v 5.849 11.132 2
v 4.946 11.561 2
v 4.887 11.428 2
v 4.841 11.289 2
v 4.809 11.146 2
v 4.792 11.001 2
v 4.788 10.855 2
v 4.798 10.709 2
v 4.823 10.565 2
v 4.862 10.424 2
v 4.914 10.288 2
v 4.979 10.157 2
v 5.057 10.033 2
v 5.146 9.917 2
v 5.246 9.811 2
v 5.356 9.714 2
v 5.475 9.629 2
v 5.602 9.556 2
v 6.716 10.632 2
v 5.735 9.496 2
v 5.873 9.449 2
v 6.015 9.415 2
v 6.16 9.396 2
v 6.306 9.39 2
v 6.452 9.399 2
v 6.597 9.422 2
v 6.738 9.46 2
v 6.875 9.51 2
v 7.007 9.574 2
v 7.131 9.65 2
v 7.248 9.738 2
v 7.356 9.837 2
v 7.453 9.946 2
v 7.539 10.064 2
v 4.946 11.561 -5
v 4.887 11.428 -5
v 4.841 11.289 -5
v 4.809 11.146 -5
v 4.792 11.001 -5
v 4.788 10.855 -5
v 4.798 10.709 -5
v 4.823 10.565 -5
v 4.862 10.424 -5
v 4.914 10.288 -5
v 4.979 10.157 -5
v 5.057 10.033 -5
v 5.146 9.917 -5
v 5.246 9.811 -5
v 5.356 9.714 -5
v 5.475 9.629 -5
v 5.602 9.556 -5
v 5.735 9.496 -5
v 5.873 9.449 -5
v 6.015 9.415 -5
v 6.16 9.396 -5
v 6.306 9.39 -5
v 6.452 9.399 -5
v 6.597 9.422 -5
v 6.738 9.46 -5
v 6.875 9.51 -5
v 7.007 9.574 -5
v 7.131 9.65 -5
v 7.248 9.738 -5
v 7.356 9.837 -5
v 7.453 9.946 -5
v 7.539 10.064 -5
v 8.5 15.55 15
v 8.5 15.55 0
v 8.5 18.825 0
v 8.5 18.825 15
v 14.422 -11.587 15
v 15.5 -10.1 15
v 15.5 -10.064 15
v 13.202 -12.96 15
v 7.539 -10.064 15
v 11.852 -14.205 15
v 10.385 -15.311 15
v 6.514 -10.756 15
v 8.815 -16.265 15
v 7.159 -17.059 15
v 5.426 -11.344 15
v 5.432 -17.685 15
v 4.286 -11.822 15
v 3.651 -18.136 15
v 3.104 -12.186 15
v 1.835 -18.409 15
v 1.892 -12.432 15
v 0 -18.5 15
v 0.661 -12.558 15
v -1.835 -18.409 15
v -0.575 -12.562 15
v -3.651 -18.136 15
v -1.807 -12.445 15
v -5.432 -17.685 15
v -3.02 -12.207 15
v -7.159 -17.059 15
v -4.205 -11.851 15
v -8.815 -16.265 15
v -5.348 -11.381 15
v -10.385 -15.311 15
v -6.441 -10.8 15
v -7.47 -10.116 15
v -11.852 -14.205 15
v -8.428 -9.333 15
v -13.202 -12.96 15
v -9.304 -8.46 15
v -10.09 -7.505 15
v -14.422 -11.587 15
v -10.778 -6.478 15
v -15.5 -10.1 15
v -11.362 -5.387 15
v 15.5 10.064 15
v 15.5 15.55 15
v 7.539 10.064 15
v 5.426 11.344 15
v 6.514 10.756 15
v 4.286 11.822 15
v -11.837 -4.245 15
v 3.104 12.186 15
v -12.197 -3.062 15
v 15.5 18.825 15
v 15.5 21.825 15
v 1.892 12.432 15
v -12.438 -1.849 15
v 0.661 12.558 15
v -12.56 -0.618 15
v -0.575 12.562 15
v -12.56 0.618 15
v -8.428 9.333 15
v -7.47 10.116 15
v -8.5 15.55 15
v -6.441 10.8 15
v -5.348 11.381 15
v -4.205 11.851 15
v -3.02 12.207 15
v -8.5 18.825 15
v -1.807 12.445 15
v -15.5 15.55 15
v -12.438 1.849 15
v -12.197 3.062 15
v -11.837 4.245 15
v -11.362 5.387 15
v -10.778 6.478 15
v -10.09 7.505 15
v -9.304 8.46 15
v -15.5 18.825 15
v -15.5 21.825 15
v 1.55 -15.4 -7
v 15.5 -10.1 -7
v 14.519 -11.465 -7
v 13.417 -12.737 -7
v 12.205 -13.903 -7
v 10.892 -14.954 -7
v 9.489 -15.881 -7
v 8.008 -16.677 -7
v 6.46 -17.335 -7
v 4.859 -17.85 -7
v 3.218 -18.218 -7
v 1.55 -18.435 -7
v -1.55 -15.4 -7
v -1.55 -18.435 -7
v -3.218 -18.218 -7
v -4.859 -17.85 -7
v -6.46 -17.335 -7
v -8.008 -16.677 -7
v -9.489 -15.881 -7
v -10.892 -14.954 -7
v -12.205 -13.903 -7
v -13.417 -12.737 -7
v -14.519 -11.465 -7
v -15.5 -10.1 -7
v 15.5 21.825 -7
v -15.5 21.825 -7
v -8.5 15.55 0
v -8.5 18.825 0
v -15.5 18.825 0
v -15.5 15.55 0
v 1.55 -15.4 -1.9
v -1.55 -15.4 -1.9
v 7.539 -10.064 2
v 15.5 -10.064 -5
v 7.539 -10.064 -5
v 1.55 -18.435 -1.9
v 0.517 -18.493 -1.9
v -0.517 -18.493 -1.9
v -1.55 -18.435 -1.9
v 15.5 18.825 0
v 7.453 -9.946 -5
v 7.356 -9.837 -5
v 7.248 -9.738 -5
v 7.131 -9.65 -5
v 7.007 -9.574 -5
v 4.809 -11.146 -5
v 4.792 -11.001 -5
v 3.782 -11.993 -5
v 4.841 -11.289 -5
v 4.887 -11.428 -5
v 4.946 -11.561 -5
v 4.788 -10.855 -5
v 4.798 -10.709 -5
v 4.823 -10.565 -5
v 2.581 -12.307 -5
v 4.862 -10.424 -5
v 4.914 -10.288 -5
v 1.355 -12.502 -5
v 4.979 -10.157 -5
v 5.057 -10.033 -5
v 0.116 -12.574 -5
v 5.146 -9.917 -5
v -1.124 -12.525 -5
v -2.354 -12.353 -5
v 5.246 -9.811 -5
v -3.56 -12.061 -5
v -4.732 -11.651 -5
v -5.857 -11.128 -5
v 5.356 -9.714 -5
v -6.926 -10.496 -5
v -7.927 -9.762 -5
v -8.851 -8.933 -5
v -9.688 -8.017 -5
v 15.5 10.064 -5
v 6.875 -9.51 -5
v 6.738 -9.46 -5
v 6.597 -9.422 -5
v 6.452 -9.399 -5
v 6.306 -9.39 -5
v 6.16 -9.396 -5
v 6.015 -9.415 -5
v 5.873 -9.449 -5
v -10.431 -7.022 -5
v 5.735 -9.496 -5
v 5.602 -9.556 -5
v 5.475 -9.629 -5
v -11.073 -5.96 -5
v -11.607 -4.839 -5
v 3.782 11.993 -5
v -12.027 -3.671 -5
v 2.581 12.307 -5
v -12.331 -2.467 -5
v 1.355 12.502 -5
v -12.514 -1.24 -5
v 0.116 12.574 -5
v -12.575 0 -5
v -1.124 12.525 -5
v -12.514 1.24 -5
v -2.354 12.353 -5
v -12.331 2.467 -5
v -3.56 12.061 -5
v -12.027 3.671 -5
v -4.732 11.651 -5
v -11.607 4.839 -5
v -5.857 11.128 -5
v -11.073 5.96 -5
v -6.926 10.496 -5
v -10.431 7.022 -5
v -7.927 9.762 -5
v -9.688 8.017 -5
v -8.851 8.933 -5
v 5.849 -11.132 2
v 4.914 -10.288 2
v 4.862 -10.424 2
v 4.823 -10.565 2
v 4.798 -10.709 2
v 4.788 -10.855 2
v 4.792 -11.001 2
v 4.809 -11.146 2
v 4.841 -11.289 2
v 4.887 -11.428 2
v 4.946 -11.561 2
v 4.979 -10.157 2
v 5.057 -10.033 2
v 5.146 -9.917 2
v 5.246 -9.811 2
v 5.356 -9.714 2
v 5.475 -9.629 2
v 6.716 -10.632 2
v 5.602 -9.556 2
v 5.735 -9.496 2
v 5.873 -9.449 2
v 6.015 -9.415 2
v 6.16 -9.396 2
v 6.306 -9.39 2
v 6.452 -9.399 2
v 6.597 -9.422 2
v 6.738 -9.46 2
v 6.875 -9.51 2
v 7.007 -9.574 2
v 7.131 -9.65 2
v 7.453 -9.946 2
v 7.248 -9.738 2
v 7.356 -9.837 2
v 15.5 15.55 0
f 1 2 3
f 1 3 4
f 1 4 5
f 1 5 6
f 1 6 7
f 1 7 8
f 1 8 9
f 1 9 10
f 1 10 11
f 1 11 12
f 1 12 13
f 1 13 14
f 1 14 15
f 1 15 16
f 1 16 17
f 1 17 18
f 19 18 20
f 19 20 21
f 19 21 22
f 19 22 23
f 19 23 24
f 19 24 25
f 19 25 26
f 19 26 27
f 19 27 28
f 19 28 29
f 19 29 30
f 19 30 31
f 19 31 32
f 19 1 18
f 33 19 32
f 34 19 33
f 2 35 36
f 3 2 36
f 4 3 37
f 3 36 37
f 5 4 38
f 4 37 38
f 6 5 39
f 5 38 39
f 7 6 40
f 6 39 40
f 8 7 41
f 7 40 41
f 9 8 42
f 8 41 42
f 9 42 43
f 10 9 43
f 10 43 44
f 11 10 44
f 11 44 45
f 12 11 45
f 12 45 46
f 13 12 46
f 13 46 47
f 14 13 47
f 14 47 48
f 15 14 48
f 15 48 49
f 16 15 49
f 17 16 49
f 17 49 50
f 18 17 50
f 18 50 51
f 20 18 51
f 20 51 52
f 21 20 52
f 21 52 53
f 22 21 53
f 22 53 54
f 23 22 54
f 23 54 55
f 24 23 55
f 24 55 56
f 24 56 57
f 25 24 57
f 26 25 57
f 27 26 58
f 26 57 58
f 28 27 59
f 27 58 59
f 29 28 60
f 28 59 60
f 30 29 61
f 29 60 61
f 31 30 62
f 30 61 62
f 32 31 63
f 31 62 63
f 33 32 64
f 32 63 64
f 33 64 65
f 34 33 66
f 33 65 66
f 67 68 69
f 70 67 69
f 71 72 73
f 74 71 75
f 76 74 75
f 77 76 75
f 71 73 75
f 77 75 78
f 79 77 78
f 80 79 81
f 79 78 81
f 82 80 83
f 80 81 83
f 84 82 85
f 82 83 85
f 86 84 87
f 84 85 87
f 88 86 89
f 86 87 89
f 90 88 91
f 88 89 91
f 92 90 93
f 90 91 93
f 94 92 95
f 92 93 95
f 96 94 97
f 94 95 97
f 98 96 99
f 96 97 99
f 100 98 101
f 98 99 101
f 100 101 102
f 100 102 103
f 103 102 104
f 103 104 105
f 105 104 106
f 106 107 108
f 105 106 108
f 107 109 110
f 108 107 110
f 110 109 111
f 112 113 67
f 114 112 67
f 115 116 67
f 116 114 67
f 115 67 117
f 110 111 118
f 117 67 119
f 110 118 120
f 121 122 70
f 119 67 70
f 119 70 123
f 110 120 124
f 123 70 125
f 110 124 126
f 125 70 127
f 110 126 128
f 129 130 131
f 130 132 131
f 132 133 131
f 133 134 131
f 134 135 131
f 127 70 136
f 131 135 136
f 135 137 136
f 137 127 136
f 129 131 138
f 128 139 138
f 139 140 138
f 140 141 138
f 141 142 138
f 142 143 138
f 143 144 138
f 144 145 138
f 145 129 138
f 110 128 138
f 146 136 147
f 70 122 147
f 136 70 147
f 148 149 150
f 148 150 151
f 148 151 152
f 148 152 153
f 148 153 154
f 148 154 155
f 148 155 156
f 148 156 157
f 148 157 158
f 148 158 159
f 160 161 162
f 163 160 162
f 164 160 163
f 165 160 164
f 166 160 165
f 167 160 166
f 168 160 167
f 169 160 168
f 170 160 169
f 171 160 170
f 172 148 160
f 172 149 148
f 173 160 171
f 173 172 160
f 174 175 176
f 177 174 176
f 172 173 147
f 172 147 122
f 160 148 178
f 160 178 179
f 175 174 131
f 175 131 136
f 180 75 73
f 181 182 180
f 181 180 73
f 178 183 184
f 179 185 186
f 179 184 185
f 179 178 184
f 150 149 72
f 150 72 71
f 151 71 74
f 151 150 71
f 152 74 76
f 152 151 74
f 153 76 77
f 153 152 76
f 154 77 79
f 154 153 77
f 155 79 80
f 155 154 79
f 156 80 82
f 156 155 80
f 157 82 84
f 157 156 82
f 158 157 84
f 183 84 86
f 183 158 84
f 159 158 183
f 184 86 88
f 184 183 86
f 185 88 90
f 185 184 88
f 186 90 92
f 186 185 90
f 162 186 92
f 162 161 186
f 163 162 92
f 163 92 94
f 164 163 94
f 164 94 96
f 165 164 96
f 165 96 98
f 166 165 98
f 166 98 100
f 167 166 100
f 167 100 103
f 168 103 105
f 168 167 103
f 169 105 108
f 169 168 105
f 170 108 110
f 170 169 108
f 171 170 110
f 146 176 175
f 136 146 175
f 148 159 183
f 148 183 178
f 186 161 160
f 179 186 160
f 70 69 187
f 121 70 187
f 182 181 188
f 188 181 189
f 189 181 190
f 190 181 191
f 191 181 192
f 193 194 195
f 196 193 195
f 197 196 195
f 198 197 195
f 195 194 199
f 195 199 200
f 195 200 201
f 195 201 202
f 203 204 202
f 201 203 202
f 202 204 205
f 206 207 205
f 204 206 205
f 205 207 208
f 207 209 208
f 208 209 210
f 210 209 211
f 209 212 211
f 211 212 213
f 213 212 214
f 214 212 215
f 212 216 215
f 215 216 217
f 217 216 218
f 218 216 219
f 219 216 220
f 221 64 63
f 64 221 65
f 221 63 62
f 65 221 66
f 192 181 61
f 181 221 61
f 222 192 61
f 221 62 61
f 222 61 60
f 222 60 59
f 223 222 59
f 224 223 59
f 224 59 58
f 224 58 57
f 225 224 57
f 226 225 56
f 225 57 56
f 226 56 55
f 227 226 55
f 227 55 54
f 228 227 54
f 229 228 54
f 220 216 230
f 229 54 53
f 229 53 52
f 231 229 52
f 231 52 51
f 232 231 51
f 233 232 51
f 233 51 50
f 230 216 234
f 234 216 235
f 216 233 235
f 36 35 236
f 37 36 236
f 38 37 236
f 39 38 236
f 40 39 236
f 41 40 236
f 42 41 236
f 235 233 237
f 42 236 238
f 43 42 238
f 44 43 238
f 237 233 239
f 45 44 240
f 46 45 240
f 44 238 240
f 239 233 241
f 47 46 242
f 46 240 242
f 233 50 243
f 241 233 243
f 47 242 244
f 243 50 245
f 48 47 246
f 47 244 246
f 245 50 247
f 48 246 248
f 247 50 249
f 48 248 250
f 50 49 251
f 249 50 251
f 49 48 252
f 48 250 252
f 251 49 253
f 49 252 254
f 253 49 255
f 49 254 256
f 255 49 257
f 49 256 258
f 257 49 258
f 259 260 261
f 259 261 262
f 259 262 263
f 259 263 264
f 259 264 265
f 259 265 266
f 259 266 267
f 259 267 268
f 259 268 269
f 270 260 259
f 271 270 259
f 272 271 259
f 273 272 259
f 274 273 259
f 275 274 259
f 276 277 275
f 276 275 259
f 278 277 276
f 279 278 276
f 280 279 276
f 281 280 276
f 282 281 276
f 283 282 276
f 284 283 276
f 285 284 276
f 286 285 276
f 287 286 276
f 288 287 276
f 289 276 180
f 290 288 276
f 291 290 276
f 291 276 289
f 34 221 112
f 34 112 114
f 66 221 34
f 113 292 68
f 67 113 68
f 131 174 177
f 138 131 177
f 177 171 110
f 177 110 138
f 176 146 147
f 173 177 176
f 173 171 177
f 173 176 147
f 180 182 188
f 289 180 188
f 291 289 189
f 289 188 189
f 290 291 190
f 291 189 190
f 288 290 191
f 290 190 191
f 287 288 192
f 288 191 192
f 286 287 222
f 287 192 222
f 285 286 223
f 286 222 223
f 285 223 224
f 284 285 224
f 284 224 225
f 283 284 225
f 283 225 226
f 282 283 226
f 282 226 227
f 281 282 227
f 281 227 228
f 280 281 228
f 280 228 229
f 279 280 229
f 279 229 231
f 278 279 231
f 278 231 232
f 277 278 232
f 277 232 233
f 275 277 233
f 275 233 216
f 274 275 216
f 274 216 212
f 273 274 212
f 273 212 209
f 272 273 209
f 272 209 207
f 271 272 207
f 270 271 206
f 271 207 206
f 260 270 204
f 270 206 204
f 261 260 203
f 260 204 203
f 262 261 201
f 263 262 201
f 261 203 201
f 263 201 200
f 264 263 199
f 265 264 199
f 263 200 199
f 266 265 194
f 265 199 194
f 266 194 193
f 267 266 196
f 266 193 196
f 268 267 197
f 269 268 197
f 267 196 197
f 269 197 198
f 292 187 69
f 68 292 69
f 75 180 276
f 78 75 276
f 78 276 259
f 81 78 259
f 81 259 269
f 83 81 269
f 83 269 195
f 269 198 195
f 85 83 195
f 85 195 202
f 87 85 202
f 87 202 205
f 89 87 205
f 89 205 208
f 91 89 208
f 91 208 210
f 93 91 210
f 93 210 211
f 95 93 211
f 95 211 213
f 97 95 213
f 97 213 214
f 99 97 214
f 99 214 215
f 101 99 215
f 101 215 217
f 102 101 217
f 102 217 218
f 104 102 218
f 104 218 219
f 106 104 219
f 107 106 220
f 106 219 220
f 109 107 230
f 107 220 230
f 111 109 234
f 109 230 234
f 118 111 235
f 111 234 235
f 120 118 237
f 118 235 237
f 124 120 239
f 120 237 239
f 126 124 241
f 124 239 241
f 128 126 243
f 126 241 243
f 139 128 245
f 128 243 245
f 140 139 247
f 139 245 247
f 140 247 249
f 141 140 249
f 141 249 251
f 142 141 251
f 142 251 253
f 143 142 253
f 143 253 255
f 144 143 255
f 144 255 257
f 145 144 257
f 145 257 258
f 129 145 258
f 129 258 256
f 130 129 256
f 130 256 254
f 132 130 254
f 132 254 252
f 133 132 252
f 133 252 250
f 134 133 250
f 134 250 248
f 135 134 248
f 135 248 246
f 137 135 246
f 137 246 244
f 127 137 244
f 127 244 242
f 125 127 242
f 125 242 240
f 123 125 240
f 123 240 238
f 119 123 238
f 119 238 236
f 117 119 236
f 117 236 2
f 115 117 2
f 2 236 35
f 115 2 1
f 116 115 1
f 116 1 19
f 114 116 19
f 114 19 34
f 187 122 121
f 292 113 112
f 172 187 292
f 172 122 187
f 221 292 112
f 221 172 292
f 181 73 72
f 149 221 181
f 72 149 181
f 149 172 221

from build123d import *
from build123d.topology import SkipClean

# Parameters (mm, degrees)
SKETCH1_R           = 12.575
BOSS_EXTRUDE1_DEPTH = 15
BOSS_EXTRUDE2_START = 7
SKETCH2_R           = 12.575
BOSS_EXTRUDE2_DEPTH = 7
SKETCH3_R           = 12.575
BOSS_EXTRUDE3_DEPTH = 2
BOSS_EXTRUDE4_DEPTH = 22
SKETCH5_W           = 3.1
SKETCH5_H           = 3.1
CUT_EXTRUDE1_DEPTH  = 5.1
SKETCH7_R           = 1.5
BOSS_EXTRUDE5_DEPTH = 7
CUT_EXTRUDE2_START  = -20
CUT_EXTRUDE2_DEPTH  = 20


with BuildPart() as part:
    # Sketch1 → Boss-Extrude1 (new body)
    with BuildSketch(Plane.XY):
        with BuildLine():
            ThreePointArc((-15.5, 0), (0, -15.5), (15.5, 0))
            Line((15.5, 0), (15.5, 15.55))
            Line((15.5, 15.55), (8.5, 15.55))
            Line((8.5, 15.55), (8.5, 18.825))
            Line((8.5, 18.825), (15.5, 18.825))
            Line((15.5, 18.825), (15.5, 21.825))
            Line((15.5, 21.825), (-15.5, 21.825))
            Line((-15.5, 21.825), (-15.5, 18.825))
            Line((-15.5, 18.825), (-8.5, 18.825))
            Line((-8.5, 18.825), (-8.5, 15.55))
            Line((-8.5, 15.55), (-15.5, 15.55))
            Line((-15.5, 15.55), (-15.5, 0))
        make_face()
        Circle(SKETCH1_R, mode=Mode.SUBTRACT)
    extrude(amount=BOSS_EXTRUDE1_DEPTH)

    # Sketch2 → Boss-Extrude2 (add)
    with SkipClean():  # the faces are left unmerged after this step: merging them gives an invalid solid
        with BuildSketch(Plane(origin=(0, 0, 0), x_dir=(-1, 0, 0), z_dir=(0, 0, -1)).offset(BOSS_EXTRUDE2_START)):
            with BuildLine():
                ThreePointArc((-15.5, 0), (0, -15.5), (15.5, 0))
                Line((15.5, 0), (15.5, 21.825))
                Line((15.5, 21.825), (-15.5, 21.825))
                Line((-15.5, 21.825), (-15.5, 0))
            make_face()
            Circle(SKETCH2_R, mode=Mode.SUBTRACT)
        extrude(amount=-BOSS_EXTRUDE2_DEPTH)

    # Sketch3 → Boss-Extrude3 (add)
    with SkipClean():  # the faces are left unmerged after this step: merging them gives an invalid solid
        with BuildSketch(Plane(origin=(0, 0, -7), x_dir=(-1, 0, 0), z_dir=(0, 0, -1))):
            Circle(SKETCH3_R)
        extrude(amount=-BOSS_EXTRUDE3_DEPTH)

    # Sketch4 → Boss-Extrude4 (add)
    with SkipClean():  # the faces are left unmerged after this step: merging them gives an invalid solid
        with BuildSketch(Plane(origin=(0, 0, -7), x_dir=(-1, 0, 0), z_dir=(0, 0, -1))):
            with BuildLine():
                Line((15.5, -10.099504938), (15.5, 0))
                ThreePointArc((15.5, 0), (0, -15.5), (-15.5, 0))
                Line((-15.5, 0), (-15.5, -10.099504938))
                ThreePointArc((-15.5, -10.099504938), (0, -18.5), (15.5, -10.099504938))
            make_face()
        extrude(amount=-BOSS_EXTRUDE4_DEPTH)

    # Sketch5 → Cut-Extrude1 (cut)
    with SkipClean():  # the faces are left unmerged after this step: merging them gives an invalid solid
        with BuildSketch(Plane(origin=(0, 0, -7), x_dir=(-1, 0, 0), z_dir=(0, 0, -1))):
            with Locations((0, -16.95)):
                Rectangle(SKETCH5_W, SKETCH5_H)
        extrude(amount=-CUT_EXTRUDE1_DEPTH, mode=Mode.SUBTRACT)

    # Sketch7 → Boss-Extrude5 (add)
    with SkipClean():  # the faces are left unmerged after this step: merging them gives an invalid solid
        with BuildSketch(Plane.XY.offset(-5)):
            with Locations((6.2875, 10.890269453)):
                Circle(SKETCH7_R)
            with Locations((6.2875, -10.890269453)):
                Circle(SKETCH7_R)
        extrude(amount=BOSS_EXTRUDE5_DEPTH)

    # Sketch6 → Cut-Extrude2 (cut)
    with BuildSketch(Plane.XY.offset(15).offset(CUT_EXTRUDE2_START)):
        with BuildLine():
            ThreePointArc((12.575, 0), (11.245882841, -5.626788082), (7.539493977, -10.064127164))
            Line((7.539493977, -10.064127164), (15.5, -10.064127164))
            Line((15.5, -10.064127164), (15.5, 10.064127164))
            Line((15.5, 10.064127164), (7.539493977, 10.064127164))
            ThreePointArc((7.539493977, 10.064127164), (11.245882841, 5.626788082), (12.575, 0))
        make_face()
    extrude(amount=CUT_EXTRUDE2_DEPTH, mode=Mode.SUBTRACT)


solid = part.part
